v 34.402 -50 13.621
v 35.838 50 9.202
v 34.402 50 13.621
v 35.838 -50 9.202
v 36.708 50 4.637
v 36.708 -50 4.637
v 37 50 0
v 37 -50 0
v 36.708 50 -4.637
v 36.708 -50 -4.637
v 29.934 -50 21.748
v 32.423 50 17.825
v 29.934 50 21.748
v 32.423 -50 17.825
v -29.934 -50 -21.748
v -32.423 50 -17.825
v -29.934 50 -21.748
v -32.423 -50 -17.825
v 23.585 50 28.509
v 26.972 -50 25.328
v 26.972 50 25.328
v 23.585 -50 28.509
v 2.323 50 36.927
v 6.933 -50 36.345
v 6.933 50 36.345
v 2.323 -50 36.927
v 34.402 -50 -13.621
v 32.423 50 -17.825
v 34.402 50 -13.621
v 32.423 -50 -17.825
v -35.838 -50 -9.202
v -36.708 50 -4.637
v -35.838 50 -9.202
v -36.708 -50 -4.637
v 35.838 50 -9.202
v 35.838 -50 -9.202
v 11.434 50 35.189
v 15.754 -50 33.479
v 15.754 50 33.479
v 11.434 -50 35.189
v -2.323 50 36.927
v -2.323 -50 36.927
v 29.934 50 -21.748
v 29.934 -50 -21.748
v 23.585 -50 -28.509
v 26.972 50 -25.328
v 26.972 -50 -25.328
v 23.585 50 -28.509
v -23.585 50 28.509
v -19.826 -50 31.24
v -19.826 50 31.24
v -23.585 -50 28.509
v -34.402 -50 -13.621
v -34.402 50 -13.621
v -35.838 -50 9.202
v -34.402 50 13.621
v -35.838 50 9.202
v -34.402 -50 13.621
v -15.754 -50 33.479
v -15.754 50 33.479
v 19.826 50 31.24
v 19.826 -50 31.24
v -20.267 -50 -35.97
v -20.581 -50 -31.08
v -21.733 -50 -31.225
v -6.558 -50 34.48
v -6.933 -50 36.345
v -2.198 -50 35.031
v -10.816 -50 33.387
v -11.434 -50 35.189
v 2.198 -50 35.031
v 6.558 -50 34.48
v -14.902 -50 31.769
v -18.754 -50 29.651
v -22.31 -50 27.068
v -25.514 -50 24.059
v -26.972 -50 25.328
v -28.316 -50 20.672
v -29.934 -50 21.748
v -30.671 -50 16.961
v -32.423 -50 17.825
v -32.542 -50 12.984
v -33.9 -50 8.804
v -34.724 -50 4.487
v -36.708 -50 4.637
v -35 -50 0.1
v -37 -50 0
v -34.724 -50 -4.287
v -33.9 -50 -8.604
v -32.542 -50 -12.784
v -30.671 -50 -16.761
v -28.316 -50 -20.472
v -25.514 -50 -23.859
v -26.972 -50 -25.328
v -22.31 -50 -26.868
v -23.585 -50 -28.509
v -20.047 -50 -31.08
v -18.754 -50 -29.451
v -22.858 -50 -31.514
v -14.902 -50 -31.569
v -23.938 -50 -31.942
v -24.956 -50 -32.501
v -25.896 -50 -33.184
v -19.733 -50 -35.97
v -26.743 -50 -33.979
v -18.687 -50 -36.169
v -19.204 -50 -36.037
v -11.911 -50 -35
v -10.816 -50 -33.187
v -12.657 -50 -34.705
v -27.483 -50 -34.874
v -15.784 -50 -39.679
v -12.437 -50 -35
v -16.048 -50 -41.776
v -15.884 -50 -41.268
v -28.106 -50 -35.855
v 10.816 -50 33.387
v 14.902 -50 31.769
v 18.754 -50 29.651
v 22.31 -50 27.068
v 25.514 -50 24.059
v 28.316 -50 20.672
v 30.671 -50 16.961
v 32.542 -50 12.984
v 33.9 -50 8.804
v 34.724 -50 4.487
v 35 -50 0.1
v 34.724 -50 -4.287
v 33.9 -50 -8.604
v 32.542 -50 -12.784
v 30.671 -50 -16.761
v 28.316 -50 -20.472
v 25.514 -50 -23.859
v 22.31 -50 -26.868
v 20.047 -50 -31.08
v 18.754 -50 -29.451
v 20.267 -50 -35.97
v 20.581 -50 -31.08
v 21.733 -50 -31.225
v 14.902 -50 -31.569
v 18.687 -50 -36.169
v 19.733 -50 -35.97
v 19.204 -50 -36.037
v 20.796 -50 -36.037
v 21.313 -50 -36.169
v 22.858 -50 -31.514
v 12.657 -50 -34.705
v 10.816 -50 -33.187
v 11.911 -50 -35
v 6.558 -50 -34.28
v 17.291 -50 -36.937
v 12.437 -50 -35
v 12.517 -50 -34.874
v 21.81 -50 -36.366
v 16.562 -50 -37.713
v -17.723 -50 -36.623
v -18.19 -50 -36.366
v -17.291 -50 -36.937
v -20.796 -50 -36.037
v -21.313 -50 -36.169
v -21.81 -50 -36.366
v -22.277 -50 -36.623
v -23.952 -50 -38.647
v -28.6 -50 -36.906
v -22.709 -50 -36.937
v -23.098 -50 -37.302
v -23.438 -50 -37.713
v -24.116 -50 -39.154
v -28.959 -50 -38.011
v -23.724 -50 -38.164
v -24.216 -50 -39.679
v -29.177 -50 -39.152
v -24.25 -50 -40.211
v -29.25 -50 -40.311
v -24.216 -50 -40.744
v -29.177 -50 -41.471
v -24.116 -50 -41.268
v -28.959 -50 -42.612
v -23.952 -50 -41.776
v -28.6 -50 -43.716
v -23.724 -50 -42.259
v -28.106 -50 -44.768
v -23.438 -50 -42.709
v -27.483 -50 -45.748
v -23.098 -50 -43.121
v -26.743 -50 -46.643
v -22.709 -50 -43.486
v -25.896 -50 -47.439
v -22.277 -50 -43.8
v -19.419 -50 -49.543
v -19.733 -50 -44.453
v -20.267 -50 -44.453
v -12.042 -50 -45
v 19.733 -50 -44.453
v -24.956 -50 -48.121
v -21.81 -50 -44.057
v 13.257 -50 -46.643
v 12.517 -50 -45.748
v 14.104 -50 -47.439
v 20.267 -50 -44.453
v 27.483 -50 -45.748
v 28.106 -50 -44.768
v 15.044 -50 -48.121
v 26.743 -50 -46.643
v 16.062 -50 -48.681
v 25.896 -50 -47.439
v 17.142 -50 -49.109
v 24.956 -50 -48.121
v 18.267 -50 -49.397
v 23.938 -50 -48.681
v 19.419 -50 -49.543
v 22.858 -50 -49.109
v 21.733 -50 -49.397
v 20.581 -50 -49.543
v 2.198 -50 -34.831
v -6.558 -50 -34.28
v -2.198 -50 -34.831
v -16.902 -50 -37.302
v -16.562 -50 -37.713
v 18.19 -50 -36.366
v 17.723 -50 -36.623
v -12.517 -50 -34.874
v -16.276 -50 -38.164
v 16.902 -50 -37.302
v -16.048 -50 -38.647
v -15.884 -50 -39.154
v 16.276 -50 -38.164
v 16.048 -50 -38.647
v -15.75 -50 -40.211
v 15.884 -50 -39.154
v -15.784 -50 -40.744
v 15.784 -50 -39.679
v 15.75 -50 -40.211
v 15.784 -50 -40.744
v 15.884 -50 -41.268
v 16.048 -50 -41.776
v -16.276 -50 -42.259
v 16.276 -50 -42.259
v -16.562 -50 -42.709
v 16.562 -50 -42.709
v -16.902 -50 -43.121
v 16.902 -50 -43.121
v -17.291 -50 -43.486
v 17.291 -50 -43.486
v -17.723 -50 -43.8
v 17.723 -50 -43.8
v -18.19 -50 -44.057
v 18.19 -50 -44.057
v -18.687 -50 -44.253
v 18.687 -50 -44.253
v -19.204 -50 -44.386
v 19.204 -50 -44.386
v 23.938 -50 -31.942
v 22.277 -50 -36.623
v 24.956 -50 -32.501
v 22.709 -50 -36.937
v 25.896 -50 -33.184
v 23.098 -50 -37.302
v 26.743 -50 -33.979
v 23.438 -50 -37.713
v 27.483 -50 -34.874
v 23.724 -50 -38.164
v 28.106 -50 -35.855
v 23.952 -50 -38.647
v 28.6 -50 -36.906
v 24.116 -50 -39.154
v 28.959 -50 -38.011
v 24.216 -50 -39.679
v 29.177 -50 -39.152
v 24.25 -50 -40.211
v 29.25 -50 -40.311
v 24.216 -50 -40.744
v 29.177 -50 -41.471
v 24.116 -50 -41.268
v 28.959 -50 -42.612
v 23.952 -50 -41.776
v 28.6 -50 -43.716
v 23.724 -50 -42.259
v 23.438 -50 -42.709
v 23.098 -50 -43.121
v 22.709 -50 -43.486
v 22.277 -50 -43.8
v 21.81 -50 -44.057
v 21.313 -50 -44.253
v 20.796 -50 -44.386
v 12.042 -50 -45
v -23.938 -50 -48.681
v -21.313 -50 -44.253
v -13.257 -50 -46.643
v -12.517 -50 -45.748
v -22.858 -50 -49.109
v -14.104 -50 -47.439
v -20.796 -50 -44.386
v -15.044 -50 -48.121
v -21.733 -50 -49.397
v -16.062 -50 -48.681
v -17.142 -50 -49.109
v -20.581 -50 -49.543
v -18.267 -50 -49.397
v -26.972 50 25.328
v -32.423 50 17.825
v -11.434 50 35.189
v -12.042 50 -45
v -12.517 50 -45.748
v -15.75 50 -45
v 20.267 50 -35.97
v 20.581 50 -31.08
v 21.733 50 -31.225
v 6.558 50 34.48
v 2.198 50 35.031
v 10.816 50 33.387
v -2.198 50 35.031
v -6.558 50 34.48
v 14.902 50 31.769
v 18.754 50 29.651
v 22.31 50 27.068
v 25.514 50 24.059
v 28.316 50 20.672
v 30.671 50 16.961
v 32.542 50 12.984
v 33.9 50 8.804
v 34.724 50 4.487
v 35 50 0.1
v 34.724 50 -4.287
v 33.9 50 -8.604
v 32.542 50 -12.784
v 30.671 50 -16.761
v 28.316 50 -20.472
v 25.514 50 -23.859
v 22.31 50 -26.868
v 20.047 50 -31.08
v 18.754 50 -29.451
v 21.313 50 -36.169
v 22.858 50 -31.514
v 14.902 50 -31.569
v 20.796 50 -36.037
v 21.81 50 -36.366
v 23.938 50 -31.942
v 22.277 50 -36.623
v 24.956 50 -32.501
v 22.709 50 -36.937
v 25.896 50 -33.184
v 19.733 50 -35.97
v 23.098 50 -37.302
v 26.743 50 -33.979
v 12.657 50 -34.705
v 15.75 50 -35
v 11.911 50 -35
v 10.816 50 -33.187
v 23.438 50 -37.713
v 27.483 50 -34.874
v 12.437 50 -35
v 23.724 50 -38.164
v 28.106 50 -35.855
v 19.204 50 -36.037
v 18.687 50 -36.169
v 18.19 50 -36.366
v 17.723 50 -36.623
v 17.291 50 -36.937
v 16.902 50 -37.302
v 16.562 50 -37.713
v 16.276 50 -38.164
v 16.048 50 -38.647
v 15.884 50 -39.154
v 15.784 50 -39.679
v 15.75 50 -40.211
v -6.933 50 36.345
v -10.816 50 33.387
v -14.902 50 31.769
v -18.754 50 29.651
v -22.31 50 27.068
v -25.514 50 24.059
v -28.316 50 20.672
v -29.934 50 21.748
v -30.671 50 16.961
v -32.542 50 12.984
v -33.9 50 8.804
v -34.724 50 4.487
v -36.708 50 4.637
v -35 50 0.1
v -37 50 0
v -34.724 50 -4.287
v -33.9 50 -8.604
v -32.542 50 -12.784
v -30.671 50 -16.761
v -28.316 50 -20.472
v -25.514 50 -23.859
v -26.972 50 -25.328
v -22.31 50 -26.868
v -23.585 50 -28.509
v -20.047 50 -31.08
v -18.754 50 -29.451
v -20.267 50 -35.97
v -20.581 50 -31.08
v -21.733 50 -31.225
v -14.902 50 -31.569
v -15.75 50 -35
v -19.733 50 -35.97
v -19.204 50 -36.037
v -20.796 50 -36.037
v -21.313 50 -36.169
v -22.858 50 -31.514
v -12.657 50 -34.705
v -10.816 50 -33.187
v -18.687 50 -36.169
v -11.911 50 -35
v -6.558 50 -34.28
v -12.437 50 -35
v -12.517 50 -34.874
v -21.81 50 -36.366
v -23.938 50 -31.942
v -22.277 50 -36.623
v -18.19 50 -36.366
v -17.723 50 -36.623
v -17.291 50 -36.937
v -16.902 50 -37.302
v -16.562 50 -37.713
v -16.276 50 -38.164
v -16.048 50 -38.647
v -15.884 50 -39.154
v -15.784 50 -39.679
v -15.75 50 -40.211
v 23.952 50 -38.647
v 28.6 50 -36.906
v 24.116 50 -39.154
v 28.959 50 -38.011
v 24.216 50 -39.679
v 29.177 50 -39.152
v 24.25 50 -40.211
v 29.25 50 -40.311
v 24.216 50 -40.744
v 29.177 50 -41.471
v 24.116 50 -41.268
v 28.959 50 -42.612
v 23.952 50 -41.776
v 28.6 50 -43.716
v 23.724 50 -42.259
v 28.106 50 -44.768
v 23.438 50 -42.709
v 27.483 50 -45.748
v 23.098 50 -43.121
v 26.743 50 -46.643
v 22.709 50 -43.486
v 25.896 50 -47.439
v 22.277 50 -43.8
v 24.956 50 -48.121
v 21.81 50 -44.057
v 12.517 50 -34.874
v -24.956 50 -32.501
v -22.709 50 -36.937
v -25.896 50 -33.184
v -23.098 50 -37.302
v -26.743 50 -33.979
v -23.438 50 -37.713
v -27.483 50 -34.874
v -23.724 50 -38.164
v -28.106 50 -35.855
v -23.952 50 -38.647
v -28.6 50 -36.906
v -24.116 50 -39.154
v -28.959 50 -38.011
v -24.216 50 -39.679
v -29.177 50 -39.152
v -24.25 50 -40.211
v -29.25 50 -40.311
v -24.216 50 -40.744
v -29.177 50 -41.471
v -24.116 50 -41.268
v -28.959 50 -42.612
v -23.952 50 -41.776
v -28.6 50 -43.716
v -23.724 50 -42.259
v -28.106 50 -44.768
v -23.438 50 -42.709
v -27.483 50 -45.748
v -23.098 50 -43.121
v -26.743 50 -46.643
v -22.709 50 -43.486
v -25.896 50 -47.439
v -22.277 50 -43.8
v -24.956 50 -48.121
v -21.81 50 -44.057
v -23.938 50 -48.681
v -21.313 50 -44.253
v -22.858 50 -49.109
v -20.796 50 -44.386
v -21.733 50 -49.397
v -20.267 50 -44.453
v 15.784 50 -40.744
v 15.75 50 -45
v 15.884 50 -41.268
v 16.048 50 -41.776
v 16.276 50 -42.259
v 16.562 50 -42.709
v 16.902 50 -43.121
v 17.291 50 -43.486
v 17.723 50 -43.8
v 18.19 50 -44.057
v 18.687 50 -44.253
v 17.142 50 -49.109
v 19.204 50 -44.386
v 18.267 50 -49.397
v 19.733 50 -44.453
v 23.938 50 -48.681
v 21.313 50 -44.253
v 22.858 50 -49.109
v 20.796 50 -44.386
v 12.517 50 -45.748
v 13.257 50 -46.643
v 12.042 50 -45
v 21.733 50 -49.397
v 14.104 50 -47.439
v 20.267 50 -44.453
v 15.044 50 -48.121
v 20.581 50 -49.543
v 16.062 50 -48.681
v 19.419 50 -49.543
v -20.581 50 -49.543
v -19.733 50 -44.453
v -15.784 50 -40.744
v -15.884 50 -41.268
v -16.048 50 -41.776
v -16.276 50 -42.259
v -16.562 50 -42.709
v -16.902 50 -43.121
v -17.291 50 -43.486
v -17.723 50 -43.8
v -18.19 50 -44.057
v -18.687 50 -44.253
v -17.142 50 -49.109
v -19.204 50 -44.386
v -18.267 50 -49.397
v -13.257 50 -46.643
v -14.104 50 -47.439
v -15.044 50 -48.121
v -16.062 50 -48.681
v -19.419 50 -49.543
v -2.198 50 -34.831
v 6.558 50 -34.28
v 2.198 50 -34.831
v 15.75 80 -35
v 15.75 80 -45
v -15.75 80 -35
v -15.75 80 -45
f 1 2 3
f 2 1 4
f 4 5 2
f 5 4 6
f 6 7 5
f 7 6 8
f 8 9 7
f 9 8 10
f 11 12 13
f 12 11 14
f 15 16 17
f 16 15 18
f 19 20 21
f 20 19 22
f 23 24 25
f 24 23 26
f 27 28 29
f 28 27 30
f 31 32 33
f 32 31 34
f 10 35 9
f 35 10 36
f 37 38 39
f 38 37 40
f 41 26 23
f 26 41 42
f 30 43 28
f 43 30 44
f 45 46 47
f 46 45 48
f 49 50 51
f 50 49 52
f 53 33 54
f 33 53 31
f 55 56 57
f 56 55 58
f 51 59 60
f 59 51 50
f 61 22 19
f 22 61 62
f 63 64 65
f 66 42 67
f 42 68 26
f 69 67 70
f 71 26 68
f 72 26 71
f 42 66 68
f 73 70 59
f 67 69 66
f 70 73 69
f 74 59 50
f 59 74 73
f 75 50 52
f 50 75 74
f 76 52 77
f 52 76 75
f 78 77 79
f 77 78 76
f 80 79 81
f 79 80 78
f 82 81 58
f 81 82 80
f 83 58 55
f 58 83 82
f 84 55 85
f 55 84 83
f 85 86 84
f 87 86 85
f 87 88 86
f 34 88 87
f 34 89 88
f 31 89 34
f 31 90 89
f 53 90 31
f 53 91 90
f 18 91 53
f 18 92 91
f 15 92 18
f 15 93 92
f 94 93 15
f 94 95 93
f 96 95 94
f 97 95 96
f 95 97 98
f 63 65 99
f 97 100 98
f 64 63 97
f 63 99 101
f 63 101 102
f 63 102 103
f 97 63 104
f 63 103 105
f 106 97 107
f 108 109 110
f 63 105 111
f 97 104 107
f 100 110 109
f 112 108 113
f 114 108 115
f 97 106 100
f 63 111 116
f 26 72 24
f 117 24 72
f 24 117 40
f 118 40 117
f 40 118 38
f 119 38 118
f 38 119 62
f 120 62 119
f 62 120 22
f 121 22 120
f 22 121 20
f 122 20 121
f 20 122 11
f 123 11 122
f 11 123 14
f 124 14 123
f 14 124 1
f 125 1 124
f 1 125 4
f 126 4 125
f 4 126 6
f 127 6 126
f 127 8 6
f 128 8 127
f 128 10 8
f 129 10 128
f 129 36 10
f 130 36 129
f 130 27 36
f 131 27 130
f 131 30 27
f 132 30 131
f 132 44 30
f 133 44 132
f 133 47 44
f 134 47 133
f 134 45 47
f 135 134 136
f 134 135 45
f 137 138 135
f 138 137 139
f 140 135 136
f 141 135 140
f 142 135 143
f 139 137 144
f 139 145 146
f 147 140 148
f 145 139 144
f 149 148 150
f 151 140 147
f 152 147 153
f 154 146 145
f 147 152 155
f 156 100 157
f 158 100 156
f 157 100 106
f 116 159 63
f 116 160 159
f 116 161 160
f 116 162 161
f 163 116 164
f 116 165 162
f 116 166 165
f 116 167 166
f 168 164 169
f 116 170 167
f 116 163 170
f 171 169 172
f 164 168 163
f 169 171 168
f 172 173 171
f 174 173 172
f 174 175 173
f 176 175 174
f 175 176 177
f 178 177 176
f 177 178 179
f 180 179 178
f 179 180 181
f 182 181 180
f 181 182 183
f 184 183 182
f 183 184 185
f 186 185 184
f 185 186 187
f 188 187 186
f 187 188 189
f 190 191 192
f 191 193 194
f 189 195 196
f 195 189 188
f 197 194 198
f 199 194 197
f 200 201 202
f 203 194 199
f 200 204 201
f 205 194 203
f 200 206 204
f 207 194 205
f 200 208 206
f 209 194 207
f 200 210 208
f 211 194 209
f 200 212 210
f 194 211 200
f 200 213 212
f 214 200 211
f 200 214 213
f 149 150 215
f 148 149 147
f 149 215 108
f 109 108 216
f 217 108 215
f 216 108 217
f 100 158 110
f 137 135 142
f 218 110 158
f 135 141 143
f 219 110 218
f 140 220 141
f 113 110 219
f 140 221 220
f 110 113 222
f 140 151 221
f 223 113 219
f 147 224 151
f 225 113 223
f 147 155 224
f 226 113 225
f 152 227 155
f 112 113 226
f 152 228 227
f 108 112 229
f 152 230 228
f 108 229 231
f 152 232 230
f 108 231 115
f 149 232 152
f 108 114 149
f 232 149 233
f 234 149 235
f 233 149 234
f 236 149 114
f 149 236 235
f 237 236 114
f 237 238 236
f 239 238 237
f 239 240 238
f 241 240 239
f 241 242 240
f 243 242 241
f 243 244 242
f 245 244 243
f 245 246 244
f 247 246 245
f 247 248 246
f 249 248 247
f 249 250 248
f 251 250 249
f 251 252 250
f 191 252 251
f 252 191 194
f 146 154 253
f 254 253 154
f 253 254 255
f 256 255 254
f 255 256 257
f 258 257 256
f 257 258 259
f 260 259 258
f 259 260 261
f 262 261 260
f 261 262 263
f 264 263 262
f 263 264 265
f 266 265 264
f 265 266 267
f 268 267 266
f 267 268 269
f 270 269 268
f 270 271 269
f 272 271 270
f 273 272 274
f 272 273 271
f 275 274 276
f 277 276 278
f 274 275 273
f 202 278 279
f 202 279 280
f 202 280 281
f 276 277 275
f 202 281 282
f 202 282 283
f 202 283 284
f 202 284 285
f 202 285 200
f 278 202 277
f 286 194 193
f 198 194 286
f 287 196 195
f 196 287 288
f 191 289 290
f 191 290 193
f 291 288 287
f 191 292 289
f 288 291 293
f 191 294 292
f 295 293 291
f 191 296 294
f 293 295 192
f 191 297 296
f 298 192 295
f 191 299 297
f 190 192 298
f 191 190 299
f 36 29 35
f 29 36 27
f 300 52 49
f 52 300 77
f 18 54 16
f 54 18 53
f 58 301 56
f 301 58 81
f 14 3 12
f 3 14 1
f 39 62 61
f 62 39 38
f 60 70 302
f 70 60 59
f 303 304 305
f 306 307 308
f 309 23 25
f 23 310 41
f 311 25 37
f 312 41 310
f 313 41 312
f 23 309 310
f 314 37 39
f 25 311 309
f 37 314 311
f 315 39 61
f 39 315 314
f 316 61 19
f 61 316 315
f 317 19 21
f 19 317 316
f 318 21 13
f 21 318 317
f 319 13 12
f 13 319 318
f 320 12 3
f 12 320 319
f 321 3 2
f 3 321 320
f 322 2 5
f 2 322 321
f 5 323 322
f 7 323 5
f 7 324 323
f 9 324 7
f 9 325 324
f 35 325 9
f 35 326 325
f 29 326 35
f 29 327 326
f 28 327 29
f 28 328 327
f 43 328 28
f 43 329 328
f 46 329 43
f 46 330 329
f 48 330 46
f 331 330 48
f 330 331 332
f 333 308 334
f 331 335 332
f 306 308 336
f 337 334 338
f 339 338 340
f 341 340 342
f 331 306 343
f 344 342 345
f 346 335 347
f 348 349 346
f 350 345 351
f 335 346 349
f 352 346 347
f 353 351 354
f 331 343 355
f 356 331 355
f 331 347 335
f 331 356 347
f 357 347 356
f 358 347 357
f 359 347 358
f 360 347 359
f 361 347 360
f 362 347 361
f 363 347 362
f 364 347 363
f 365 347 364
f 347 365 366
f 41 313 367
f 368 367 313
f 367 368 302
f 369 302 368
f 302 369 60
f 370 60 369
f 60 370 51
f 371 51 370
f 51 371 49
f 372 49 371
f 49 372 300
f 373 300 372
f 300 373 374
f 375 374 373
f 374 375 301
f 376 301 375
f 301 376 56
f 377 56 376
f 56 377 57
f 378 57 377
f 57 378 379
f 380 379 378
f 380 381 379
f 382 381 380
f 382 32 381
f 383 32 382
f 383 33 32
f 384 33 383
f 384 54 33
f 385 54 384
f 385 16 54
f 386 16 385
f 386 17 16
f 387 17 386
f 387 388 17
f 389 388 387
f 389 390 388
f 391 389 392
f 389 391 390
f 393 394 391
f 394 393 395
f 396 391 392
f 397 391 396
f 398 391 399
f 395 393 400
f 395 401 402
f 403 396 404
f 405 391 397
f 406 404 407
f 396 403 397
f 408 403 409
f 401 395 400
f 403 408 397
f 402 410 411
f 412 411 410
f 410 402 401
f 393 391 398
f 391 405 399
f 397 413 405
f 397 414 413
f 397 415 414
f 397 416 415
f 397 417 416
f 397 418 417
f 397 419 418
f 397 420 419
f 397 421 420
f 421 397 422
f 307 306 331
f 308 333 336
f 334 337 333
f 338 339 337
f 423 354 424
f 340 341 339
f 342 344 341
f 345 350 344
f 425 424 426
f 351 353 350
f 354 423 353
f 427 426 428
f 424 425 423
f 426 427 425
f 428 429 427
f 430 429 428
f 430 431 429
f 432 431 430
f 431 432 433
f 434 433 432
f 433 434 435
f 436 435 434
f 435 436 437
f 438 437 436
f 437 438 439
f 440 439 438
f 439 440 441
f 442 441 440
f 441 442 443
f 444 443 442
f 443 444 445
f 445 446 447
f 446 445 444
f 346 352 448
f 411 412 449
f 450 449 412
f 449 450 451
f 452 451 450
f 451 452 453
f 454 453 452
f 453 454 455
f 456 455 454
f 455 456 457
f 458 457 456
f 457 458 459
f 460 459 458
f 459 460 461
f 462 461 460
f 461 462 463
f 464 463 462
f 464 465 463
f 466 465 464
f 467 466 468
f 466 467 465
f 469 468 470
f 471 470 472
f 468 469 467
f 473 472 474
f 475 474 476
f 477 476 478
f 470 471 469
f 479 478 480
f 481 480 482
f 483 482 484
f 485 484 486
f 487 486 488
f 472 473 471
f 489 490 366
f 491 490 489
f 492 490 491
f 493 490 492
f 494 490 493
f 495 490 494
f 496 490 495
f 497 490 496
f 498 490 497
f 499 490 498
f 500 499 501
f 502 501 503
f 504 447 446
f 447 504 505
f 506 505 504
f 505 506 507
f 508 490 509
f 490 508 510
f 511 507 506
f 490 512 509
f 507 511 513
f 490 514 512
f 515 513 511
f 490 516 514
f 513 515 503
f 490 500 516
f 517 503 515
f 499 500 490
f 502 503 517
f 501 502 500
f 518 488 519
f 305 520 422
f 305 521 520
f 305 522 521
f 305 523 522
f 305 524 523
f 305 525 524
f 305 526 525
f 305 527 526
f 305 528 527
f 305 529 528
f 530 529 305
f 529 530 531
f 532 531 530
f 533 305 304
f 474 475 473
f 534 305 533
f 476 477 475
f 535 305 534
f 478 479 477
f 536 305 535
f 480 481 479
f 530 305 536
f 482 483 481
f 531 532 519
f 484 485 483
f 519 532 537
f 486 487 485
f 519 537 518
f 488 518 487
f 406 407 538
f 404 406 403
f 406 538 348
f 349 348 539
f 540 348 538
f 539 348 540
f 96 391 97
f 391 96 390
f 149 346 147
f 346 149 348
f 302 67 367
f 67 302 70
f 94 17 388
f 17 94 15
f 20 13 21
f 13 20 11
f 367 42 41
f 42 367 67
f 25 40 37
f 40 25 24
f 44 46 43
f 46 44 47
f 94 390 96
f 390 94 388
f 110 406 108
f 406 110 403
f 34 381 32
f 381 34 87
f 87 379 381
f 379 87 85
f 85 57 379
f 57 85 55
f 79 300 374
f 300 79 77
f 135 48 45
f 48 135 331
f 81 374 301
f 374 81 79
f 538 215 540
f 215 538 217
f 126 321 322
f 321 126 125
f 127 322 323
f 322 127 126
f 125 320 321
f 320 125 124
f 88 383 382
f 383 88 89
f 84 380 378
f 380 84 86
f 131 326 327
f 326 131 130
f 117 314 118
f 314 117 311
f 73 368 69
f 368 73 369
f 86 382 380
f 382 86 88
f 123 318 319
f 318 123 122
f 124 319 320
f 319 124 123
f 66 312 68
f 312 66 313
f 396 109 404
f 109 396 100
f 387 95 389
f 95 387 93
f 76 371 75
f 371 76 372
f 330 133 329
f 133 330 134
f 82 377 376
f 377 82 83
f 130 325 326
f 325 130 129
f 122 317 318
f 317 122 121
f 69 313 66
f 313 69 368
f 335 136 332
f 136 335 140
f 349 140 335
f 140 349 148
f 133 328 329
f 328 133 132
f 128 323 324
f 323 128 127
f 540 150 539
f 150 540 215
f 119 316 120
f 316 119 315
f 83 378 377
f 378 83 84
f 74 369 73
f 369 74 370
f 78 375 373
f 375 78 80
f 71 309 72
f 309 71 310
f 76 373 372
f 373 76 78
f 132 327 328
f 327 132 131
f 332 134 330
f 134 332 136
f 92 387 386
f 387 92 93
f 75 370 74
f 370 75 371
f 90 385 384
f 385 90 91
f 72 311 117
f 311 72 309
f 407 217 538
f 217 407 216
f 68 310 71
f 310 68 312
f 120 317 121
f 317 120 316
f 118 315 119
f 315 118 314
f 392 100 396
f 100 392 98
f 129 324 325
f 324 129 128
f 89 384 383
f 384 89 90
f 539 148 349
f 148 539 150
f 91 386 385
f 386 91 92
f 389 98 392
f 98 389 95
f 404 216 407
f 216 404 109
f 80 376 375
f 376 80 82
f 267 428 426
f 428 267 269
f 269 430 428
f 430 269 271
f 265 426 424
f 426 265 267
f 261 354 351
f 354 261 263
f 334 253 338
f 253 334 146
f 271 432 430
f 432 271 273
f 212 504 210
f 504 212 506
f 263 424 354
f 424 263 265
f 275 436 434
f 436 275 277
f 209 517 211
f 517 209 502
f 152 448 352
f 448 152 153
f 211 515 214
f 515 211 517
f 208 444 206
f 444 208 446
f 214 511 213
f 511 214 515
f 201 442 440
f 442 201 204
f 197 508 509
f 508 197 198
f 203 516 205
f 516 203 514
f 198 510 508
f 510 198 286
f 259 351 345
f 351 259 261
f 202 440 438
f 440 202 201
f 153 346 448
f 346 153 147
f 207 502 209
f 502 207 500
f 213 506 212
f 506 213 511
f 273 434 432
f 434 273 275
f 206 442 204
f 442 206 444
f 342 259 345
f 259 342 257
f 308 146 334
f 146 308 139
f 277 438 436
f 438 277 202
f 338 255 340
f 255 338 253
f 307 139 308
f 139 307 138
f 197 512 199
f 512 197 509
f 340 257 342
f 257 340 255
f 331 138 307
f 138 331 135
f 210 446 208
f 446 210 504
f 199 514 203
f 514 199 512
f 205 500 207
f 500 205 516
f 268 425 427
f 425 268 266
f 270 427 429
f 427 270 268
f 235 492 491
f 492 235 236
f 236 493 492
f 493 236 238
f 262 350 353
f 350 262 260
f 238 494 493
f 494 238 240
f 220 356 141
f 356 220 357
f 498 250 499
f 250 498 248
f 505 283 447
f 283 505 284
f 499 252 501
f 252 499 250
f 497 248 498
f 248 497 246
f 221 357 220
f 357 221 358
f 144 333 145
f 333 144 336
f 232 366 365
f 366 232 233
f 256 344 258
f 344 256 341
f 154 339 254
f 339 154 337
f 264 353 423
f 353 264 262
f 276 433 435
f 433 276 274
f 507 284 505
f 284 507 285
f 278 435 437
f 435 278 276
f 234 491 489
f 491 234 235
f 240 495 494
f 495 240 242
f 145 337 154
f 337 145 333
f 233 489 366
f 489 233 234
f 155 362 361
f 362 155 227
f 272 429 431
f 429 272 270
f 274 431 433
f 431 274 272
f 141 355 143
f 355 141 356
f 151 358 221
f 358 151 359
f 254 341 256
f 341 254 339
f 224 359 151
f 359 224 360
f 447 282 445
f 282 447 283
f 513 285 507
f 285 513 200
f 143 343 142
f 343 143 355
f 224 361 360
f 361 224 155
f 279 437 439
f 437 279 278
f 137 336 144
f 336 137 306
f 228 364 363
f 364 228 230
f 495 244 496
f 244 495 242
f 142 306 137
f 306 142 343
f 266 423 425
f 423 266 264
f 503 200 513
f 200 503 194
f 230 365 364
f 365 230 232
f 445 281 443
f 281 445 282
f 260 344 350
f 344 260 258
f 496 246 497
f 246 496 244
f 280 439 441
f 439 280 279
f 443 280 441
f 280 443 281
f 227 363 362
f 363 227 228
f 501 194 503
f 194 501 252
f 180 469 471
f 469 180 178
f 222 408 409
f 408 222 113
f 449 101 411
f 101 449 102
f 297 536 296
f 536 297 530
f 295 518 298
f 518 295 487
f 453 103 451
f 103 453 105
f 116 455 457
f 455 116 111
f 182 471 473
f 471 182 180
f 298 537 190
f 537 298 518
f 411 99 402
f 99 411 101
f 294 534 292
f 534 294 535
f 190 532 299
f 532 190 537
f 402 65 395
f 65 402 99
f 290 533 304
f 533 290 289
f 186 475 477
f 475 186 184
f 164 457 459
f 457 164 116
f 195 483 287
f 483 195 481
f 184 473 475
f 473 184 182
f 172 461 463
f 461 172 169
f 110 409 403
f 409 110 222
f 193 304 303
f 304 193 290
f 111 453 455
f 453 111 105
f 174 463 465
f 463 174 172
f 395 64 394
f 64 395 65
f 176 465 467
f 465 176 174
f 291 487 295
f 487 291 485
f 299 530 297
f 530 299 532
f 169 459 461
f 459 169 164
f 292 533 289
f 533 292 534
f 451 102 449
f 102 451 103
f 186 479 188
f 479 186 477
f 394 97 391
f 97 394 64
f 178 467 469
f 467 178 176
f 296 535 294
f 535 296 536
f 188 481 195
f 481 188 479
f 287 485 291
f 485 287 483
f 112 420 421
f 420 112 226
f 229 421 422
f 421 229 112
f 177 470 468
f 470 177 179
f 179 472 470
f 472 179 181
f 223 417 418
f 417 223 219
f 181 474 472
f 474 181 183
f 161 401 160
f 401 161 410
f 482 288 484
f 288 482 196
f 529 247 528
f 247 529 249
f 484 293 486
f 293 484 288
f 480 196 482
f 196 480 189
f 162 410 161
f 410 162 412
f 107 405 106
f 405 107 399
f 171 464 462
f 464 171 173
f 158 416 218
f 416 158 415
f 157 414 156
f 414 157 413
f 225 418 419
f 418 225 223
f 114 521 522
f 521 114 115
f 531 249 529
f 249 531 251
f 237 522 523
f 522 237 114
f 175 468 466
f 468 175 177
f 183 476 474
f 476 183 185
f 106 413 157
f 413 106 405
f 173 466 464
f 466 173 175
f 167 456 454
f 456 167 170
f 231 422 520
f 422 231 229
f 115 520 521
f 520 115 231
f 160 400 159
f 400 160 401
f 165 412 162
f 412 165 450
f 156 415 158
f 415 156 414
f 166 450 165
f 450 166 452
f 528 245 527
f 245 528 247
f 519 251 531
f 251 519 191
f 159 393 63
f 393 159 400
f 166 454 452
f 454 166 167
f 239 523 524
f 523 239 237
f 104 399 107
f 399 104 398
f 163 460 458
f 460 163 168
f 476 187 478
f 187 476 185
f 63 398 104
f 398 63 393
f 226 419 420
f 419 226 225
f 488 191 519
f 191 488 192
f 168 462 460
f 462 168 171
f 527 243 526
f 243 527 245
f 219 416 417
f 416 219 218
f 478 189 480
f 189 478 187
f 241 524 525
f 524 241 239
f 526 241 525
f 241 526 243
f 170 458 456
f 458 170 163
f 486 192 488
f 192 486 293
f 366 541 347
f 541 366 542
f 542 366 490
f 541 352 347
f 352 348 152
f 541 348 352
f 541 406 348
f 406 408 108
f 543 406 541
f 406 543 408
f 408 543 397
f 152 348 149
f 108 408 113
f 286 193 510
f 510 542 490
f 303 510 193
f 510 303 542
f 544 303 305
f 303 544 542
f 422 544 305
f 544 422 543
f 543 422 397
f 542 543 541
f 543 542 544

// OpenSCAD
// file: variables.scad
// ##########################################//
// General
// ##########################################//
$fn = 50;
DIFFERENCE_FIX = 0.1;
DIFFERENCE_FIX_NEGATIVE = -1 * DIFFERENCE_FIX;
DIFFERENCE_FIX_2 = 2 * DIFFERENCE_FIX;

// ##########################################//
// Nose
// ##########################################//
noseTopThickness = 1;
noseTopOffsetZ = 60;
noseHeight = noseTopOffsetZ + noseTopThickness;
noseLength = 100;
noseTopEndOffset = 20;
noseTopSharpnessFactor = 4;
noseBotttomSharpnessFactor = 3;
noseTopThicknessFactor = 1;
noseBottomThicknessFactor = 3;

// ##########################################//
// Hull
// ##########################################//
hullThickness = 3;
hullWidth = 70 - hullThickness * 2;
hullLength = 500 - hullThickness * 2;
hullHeight = noseHeight + hullThickness;
hullSpacing = 100;
hullCutoutWidth = 46;
hullCutoutHeight = 150;

// ##########################################//
// Hull Mounts
// ##########################################//
hullMountHoleRadius = 4.25;
hullMountHeight = 20;
hullMountWidth = 20;
hullMountDepth = 50;
hullMountOffsetY = 100;

// ##########################################//
// Rod Connectors
// ##########################################//
rodConnectorWidth = 20;
rodConnectorRadius = 10;
rodConnectorTopOffset = 3;

// ##########################################//
// Lid
// ##########################################//
lidLip = 5;
lidThickness = 3;
lidGap = 0.4;

// ##########################################//
// Motor mount
// ##########################################//
motorMountMotorRadius = 35;
motorMountMotorDepth = 100;
motorMountThickness = 4;
motorMountMountThickness = 5;
motorMountMountOffsetX = 20;
motorMountSupportHeight = 10;
motorMountSupportExtensionY = 30;
motorMountOffsetY = 300;
// main file
include <variables.scad>

// Cylinder to fit motor in
module motorCylinder() {
    rotate([90, 0, 0])

    difference() {
        // Outer motor mount
        cylinder(h = motorMountMotorDepth, r = motorMountMotorRadius + motorMountThickness / 2, center = true);

        // Motor mount thickness
        translate([0, DIFFERENCE_FIX, 0])
        cylinder(h = motorMountMotorDepth + DIFFERENCE_FIX_2, r = motorMountMotorRadius, center = true);
    }
}

// Motor mount supports that mount to rods
module motorMountMount() {
    rotate([90, 0, 0])

    difference() {
        // Outer motor mount
        cylinder(h = motorMountMotorDepth, r = hullMountHoleRadius + motorMountMountThickness, center = true);

        // Cutout
        translate([0, DIFFERENCE_FIX, 0])
        cylinder(h = motorMountMotorDepth + DIFFERENCE_FIX_2, r = hullMountHoleRadius, center = true);
    }
}

// Additional support between motor mounts and motor cylinder
module motorMountSupport() {
    cube([
        2 * (motorMountMountOffsetX - hullMountHoleRadius),
        motorMountMotorDepth + motorMountSupportExtensionY,
        motorMountSupportHeight
    ],center = true);
}

// Calculate the Z offset for the supports that mount to the rods (dependent from
// distance from x)
function motorMountMountOffsetZ(x) = sqrt(pow(motorMountMotorRadius, 2) + pow(x, 2));

// Motor mount
module motorMount() {
    // Cylinder for motor
    motorCylinder();

    // Right motor mount
    translate([motorMountMountOffsetX, 0, -motorMountMountOffsetZ(motorMountMountOffsetX)])
    motorMountMount();

    // Left motor mount
    translate([-motorMountMountOffsetX, 0, -motorMountMountOffsetZ(motorMountMountOffsetX)])
    motorMountMount();

    // Additonal support
    translate([
        0,
        motorMountSupportExtensionY / 2,
        -motorMountMountOffsetZ(0) - motorMountSupportHeight / 2
    ])
    motorMountSupport();
}

motorMount();
